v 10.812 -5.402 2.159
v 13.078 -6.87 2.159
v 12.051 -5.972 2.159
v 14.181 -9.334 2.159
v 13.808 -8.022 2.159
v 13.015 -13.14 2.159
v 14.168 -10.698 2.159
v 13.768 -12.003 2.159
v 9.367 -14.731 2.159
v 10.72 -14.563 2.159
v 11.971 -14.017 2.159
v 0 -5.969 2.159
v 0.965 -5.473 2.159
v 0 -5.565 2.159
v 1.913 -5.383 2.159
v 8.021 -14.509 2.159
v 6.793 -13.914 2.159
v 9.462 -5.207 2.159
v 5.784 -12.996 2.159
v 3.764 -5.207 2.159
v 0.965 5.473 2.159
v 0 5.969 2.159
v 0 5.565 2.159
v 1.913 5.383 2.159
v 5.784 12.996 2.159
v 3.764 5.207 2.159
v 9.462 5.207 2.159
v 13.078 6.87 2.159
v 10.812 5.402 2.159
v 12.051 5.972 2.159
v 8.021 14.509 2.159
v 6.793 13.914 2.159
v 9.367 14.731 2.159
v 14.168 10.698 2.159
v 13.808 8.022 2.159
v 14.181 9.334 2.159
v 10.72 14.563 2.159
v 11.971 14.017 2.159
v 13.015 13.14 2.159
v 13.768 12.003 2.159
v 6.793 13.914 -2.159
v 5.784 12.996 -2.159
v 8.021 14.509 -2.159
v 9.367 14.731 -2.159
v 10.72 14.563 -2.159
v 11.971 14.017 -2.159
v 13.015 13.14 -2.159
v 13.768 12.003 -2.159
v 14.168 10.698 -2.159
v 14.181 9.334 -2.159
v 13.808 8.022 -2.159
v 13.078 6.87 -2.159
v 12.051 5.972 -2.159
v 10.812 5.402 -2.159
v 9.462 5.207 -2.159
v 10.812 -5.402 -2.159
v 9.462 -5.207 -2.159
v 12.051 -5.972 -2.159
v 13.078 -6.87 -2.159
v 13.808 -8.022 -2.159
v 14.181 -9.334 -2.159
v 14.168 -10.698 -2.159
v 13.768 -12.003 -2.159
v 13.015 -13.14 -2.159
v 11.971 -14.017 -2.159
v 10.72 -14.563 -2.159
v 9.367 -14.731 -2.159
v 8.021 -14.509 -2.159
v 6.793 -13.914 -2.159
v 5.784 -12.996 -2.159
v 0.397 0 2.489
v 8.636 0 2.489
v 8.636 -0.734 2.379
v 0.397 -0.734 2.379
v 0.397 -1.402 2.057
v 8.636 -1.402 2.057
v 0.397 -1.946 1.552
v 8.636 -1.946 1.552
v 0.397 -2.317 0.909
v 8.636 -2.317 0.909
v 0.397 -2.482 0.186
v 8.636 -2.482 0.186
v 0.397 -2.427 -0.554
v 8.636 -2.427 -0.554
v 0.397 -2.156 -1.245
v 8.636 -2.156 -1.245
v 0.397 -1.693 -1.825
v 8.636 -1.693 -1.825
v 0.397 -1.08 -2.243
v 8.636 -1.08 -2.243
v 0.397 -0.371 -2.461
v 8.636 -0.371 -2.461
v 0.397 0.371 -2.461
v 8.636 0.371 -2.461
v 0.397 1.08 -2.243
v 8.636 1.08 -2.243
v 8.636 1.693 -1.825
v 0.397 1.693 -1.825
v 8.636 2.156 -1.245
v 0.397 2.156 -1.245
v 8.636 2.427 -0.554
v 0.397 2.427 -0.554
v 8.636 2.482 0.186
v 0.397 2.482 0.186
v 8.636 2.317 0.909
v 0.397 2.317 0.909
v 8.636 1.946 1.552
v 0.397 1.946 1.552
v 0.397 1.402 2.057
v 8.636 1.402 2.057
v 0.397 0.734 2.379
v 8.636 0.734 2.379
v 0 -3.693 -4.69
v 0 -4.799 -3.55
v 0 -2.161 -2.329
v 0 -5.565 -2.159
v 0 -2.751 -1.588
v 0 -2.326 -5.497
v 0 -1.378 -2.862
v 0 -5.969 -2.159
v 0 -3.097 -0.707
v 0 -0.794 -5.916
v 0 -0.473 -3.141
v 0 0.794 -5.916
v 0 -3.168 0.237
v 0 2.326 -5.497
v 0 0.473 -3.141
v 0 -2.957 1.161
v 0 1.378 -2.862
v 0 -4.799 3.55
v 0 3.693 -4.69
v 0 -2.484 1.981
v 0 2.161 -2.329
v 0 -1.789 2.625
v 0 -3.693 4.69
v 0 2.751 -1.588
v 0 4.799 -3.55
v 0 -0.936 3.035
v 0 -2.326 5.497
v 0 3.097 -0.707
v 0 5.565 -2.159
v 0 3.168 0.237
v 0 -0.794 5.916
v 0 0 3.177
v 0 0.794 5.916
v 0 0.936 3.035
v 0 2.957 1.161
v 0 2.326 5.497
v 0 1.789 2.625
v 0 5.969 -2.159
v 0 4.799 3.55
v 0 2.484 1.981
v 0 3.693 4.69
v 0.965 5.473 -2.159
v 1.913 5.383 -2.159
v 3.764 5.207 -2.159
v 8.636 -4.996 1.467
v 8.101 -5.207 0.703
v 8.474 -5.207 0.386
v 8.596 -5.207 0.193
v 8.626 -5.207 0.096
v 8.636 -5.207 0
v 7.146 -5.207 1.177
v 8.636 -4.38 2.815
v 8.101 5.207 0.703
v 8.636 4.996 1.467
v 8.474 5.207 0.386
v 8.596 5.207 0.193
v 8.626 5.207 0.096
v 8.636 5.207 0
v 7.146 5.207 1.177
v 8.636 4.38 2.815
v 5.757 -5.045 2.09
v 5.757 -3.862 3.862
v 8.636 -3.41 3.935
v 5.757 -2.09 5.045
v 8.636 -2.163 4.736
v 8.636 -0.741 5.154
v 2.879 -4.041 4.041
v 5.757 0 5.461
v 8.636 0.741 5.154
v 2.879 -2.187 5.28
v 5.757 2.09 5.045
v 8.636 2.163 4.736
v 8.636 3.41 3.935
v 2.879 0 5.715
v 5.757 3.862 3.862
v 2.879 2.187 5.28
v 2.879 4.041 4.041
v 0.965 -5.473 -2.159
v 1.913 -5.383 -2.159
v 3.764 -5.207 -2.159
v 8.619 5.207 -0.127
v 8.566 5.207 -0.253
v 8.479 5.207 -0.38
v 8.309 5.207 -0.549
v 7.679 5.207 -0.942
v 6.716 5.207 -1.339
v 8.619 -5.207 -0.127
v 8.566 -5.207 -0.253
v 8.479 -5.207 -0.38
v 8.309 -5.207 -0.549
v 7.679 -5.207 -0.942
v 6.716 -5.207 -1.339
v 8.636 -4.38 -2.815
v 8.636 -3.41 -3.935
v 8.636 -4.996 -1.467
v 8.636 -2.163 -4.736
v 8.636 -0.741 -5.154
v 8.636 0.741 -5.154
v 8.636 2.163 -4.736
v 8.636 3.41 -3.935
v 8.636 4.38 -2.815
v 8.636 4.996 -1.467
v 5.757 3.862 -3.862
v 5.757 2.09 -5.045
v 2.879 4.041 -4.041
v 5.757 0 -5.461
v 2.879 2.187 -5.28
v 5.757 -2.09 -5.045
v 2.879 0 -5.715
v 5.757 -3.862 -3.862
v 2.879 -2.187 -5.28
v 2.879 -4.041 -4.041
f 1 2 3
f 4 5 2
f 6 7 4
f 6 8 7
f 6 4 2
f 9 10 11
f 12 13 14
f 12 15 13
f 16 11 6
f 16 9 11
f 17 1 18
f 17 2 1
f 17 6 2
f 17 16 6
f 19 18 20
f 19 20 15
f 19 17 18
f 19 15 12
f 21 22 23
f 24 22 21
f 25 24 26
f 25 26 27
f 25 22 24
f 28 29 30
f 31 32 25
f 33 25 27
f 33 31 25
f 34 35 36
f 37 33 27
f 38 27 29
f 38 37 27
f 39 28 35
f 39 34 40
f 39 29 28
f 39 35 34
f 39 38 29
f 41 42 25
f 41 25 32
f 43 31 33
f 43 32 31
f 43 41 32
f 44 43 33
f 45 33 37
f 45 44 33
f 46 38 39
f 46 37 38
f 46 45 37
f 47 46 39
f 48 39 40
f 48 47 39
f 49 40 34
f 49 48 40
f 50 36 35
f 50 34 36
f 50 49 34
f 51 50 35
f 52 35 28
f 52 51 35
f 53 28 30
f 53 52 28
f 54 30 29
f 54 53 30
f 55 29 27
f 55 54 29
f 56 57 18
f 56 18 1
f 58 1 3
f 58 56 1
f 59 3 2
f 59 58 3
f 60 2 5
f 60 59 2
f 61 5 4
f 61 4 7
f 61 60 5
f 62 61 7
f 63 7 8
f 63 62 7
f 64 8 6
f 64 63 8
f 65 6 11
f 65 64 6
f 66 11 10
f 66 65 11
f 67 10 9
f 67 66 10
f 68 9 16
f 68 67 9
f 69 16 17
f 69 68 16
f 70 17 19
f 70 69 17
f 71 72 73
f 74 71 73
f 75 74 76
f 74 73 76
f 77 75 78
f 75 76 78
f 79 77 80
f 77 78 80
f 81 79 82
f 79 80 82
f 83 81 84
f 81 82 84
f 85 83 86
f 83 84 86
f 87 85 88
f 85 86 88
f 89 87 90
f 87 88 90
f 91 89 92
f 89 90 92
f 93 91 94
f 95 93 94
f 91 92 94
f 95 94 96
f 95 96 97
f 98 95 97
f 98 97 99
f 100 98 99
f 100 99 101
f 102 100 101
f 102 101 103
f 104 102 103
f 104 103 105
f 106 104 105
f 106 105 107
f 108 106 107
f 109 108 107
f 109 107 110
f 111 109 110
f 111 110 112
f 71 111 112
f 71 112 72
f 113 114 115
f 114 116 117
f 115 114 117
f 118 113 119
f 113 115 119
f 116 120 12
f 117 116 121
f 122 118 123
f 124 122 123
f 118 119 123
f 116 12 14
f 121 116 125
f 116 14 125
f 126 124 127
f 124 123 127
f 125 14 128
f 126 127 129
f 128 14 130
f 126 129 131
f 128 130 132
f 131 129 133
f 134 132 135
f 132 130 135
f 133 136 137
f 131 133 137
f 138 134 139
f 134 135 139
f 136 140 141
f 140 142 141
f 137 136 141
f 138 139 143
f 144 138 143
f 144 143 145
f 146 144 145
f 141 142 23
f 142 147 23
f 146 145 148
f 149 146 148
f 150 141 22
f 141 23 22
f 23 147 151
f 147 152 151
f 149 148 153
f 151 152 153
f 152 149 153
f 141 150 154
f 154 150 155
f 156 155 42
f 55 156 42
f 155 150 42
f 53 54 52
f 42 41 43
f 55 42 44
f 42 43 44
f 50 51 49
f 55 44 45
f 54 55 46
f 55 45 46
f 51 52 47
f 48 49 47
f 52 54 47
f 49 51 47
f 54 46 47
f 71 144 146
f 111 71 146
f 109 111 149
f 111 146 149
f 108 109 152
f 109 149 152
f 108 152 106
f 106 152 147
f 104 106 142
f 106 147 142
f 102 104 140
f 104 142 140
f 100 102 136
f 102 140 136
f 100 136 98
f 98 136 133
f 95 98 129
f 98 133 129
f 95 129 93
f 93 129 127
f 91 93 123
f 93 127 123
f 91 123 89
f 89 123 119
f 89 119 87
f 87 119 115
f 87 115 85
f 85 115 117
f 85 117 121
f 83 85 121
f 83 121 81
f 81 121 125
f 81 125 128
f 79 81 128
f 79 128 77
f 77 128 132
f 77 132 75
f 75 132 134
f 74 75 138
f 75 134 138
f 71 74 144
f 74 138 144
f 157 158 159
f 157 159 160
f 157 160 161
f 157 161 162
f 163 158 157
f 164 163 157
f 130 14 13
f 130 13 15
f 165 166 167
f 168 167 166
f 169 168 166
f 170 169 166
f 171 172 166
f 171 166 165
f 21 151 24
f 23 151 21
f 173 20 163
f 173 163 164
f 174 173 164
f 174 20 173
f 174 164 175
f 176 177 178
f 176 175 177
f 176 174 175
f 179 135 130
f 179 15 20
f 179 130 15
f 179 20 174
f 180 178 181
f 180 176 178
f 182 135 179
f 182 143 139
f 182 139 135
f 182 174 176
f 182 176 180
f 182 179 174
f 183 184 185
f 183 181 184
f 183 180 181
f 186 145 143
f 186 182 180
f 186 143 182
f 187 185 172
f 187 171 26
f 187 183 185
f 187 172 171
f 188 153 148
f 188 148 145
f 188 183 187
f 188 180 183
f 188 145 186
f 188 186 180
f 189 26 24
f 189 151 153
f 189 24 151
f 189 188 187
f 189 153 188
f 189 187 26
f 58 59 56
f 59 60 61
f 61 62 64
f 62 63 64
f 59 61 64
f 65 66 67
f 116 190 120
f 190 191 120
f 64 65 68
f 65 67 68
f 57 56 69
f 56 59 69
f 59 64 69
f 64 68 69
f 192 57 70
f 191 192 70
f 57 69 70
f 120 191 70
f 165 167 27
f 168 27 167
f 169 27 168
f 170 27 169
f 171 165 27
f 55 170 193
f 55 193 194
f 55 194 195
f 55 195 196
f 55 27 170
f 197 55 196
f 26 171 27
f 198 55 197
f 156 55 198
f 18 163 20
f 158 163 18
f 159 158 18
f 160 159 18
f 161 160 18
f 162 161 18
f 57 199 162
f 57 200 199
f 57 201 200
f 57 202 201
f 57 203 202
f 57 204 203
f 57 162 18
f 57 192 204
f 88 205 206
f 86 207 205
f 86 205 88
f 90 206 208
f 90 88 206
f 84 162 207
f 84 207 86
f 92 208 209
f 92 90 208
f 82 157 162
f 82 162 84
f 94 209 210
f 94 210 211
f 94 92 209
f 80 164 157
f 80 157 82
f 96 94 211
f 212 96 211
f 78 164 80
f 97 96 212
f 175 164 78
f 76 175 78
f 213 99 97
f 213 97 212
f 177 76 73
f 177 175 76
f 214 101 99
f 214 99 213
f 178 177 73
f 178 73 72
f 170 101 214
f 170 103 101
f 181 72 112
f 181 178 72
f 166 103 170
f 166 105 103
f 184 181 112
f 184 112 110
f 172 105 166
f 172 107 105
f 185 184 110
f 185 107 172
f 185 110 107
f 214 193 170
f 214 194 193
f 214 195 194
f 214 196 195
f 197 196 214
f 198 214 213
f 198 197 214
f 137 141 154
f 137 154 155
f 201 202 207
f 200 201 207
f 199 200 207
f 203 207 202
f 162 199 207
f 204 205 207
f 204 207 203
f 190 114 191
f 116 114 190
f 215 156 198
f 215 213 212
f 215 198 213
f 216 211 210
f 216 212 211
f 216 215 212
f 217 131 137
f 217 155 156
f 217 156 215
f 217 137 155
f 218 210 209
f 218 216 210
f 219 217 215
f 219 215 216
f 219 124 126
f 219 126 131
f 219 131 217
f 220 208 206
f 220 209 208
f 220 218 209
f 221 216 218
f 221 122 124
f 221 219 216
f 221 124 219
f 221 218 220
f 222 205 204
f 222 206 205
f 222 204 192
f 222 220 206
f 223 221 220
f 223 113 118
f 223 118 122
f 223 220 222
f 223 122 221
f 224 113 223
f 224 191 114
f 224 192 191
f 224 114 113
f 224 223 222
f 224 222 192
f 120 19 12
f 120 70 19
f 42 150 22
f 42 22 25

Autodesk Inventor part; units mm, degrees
ref_plane "YZ Plane" through (0, 0, 0) normal (1, 0, 0) x (0, 1, 0)
ref_plane "XZ Plane" through (0, 0, 0) normal (0, 1, 0) x (-1, 0, 0)
sketch "Sketch1" plane through (0, 0, 0) normal (0, 0, 1) x (1, 0, 0)
  line L0 (0, 0) -> (8.636, 0)
  line L1 (0, 0) -> (0, 5.969)
  line L2 (8.636, 5.207) -> (8.636, 0)
  line L3 (0, 5.969) -> (5.7845, 12.9962)
  line L4 (8.636, 5.207) -> (9.4615, 5.207)
  arc A0 (9.4615, 5.207) -> (5.7845, 12.9962) centre (9.4615, 9.9695) ccw
  line L5 (8.636, 5.207) -> (0, 5.969)
  line L6 (8.636, 5.207) -> (0, 5.207)
  dimension "d0" = 10.414
  dimension "d1" = 9.4615
  dimension "d2" = 9.9695
  dimension "d3" = 4.7625
  dimension "d4" = 8.636
  dimension "d5" = 11.938
revolve "Body" add sketch "Sketch1" angle 360 about axis through (0, 0, 0) along (1, 0, 0) contours L1 L6 L2 L0 | L1 L5 L6
extrude "Wing1" add sketch "Sketch1" along normal mid plane 4.318 contours L1 L5 L6 | L5 L3 A0 L4
fillet "Fillet1" [suppressed]
mirror "Wing2" about plane through (0, 0, 0) normal (0, 1, 0) of "Wing1"
sketch "Sketch2" plane through (0, 0, 0) normal (1, 0, 0) x (0, 1, 0)
  line L0 (0, -14) -> (0, 14) projected
  line L1 (-14, 0) -> (14, 0) projected
  point P0 (0, 0)
hole "Thread" at (0, 0, 0) direction (1, 0, 0) diameter 4.9784 end through all thread size "1/4-20 UNC" class "2B" standard "ANSI Unified Screw Threads"
chamfer "Chamfer1" distance 0.6874 angle 30 1 edges at (0, 0, -2.4892) measured on face at (0, -4.5336, 0.1)
ref_plane "Work Plane1" through (34.8277, 0, 0) normal (0, 0, -1) x (1, 0, 0)
equation "\"d0\" = KOD2"
equation "\"d1\" = KOH1 - RR"
equation "\"d2\" = 0.5 * E0 - RR"
equation "\"d3\" = RR"
equation "\"d4\" = KOH"
equation "\"d5\" = KOD"
equation "\"d6\" = SW"
equation "\"d8\" = 0.333333 * SW"
equation "\"d9\" = -0.5 * GD1 + 0.5 * NND"
equation "\"d109\" = -0.5 * GD1 + 0.5 * NND"
equation "\"NND\" = 6.35"
equation "\"KOH\" = 8.636"
equation "\"KOH1\" = 14.224"
equation "\"SW\" = 4.318"
equation "\"KOD\" = 11.938"
equation "\"KOD2\" = 10.414"
equation "\"RR\" = 4.7625"
equation "\"E0\" = 29.464"
equation "\"THREADDIA\" = 6.35"
equation "\"TOA\" = 30deg"
equation "\"RR2\" = 1.905"
equation "\"SW1\" = SW"
equation "\"GD1\" = 4.975185"
properties part number "ANSI B18.17 - 1/4 - 20, TBS1WNI" material "Steel, Mild"
